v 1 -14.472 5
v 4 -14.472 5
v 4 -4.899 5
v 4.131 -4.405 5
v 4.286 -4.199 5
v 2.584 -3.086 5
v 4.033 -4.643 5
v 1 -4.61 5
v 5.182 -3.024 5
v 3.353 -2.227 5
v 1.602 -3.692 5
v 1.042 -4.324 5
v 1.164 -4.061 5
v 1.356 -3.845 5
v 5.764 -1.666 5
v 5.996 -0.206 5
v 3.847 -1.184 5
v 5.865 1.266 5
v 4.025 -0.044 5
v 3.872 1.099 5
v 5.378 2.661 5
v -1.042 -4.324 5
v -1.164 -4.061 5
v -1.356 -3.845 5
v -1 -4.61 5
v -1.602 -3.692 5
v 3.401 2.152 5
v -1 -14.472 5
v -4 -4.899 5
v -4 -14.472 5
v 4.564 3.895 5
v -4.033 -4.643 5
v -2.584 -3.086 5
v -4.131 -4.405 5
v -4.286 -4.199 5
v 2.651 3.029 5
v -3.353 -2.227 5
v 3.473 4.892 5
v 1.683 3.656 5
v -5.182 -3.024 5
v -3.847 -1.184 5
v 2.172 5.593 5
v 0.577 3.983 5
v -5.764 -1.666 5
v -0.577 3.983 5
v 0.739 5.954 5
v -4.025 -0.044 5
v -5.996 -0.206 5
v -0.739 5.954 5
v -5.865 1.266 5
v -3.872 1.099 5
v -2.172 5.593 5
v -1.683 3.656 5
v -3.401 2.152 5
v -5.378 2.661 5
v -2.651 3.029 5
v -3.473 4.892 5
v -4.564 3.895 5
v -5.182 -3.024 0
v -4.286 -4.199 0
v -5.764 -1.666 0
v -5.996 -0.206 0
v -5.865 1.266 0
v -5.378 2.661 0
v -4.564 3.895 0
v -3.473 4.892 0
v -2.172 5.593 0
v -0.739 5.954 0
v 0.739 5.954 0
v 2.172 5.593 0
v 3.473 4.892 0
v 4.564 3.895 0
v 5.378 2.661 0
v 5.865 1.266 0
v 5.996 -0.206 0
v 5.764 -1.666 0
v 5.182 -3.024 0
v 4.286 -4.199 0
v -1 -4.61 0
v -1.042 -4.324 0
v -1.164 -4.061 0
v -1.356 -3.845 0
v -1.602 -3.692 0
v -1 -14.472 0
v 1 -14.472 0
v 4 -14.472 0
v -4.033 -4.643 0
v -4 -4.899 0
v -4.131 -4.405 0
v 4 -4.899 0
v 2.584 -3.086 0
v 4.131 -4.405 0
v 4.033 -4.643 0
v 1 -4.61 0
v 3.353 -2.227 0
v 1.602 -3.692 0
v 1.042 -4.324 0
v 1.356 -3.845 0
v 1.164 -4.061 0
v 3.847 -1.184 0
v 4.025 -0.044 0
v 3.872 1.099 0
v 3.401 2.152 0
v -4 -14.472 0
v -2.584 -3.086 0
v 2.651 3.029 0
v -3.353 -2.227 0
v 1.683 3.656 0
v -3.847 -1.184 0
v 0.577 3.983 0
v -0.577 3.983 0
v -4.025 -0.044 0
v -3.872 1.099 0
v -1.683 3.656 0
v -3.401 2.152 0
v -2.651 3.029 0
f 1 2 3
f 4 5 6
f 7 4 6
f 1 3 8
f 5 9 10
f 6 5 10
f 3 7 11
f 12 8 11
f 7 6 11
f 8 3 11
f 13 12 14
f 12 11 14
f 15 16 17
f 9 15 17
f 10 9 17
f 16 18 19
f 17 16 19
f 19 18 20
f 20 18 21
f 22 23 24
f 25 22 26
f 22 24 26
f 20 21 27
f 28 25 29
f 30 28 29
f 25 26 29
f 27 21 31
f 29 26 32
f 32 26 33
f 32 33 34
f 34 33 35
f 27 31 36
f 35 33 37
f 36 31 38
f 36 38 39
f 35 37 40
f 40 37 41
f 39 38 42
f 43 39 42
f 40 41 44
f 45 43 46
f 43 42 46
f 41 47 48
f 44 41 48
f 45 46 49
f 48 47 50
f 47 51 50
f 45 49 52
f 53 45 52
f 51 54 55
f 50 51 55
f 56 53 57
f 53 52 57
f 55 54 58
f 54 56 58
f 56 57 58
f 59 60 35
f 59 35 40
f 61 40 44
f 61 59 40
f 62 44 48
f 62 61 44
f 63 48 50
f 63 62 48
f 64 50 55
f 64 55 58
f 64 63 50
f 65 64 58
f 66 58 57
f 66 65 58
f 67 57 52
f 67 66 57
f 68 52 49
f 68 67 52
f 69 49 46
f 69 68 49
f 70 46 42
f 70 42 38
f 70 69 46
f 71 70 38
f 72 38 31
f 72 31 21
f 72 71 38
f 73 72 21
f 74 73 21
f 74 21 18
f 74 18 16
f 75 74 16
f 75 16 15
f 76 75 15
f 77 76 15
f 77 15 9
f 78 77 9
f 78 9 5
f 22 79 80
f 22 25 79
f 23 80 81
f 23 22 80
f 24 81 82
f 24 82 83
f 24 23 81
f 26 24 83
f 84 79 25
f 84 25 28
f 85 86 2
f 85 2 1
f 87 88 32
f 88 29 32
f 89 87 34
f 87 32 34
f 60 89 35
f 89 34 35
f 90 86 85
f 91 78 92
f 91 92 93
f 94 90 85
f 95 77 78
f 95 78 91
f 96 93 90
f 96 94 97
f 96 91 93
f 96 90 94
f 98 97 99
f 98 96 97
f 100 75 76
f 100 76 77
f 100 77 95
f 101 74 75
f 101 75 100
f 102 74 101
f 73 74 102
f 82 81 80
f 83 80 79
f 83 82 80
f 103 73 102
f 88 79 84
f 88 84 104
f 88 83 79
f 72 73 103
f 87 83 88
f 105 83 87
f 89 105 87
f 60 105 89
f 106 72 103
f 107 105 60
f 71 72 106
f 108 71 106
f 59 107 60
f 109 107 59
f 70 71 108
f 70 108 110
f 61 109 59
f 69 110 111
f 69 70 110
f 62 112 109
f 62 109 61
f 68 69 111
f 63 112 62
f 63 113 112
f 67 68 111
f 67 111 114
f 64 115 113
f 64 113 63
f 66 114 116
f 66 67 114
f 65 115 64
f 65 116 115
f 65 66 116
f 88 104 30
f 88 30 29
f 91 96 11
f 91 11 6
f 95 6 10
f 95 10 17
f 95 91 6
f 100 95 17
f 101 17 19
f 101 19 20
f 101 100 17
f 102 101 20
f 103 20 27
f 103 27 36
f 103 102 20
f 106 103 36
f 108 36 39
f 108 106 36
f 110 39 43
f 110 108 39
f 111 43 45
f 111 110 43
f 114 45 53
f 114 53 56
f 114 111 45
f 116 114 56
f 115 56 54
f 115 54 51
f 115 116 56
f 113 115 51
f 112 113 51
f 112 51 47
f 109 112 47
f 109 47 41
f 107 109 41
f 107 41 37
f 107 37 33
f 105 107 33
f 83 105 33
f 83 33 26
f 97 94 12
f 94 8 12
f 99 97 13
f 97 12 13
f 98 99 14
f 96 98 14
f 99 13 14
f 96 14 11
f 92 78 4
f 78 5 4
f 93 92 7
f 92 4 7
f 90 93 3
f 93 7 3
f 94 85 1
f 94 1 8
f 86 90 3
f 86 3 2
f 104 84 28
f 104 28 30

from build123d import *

# Parameters (mm, degrees)
BOSS_EXTRUDE1_DEPTH = 5
FILLET1_R           = 1


with BuildPart() as part:
    # Sketch1 → Boss-Extrude1 (new body)
    with BuildSketch(Plane.XY):
        with BuildLine():
            Line((-1, -3.898797892), (-1, -14.472135955))
            Line((-1, -14.472135955), (-4, -14.472135955))
            Line((-4, -14.472135955), (-4, -4.472135955))
            ThreePointArc((-4, -4.472135955), (0, 6), (4, -4.472135955))
            Line((4, -4.472135955), (4, -14.472135955))
            Line((4, -14.472135955), (1, -14.472135955))
            Line((1, -14.472135955), (1, -3.898797892))
            ThreePointArc((1, -3.898797892), (0, 4.025), (-1, -3.898797892))
        make_face()
    extrude(amount=BOSS_EXTRUDE1_DEPTH)

    # Fillet1
    fillet1_edges = [part.edges().sort_by_distance(p)[0] for p in [
        (-1, -3.898797892, 2.5),
        (-4, -4.472135955, 2.5),
        (4, -4.472135955, 2.5),
        (1, -3.898797892, 2.5),
    ]]
    fillet(fillet1_edges, radius=FILLET1_R)


solid = part.part
